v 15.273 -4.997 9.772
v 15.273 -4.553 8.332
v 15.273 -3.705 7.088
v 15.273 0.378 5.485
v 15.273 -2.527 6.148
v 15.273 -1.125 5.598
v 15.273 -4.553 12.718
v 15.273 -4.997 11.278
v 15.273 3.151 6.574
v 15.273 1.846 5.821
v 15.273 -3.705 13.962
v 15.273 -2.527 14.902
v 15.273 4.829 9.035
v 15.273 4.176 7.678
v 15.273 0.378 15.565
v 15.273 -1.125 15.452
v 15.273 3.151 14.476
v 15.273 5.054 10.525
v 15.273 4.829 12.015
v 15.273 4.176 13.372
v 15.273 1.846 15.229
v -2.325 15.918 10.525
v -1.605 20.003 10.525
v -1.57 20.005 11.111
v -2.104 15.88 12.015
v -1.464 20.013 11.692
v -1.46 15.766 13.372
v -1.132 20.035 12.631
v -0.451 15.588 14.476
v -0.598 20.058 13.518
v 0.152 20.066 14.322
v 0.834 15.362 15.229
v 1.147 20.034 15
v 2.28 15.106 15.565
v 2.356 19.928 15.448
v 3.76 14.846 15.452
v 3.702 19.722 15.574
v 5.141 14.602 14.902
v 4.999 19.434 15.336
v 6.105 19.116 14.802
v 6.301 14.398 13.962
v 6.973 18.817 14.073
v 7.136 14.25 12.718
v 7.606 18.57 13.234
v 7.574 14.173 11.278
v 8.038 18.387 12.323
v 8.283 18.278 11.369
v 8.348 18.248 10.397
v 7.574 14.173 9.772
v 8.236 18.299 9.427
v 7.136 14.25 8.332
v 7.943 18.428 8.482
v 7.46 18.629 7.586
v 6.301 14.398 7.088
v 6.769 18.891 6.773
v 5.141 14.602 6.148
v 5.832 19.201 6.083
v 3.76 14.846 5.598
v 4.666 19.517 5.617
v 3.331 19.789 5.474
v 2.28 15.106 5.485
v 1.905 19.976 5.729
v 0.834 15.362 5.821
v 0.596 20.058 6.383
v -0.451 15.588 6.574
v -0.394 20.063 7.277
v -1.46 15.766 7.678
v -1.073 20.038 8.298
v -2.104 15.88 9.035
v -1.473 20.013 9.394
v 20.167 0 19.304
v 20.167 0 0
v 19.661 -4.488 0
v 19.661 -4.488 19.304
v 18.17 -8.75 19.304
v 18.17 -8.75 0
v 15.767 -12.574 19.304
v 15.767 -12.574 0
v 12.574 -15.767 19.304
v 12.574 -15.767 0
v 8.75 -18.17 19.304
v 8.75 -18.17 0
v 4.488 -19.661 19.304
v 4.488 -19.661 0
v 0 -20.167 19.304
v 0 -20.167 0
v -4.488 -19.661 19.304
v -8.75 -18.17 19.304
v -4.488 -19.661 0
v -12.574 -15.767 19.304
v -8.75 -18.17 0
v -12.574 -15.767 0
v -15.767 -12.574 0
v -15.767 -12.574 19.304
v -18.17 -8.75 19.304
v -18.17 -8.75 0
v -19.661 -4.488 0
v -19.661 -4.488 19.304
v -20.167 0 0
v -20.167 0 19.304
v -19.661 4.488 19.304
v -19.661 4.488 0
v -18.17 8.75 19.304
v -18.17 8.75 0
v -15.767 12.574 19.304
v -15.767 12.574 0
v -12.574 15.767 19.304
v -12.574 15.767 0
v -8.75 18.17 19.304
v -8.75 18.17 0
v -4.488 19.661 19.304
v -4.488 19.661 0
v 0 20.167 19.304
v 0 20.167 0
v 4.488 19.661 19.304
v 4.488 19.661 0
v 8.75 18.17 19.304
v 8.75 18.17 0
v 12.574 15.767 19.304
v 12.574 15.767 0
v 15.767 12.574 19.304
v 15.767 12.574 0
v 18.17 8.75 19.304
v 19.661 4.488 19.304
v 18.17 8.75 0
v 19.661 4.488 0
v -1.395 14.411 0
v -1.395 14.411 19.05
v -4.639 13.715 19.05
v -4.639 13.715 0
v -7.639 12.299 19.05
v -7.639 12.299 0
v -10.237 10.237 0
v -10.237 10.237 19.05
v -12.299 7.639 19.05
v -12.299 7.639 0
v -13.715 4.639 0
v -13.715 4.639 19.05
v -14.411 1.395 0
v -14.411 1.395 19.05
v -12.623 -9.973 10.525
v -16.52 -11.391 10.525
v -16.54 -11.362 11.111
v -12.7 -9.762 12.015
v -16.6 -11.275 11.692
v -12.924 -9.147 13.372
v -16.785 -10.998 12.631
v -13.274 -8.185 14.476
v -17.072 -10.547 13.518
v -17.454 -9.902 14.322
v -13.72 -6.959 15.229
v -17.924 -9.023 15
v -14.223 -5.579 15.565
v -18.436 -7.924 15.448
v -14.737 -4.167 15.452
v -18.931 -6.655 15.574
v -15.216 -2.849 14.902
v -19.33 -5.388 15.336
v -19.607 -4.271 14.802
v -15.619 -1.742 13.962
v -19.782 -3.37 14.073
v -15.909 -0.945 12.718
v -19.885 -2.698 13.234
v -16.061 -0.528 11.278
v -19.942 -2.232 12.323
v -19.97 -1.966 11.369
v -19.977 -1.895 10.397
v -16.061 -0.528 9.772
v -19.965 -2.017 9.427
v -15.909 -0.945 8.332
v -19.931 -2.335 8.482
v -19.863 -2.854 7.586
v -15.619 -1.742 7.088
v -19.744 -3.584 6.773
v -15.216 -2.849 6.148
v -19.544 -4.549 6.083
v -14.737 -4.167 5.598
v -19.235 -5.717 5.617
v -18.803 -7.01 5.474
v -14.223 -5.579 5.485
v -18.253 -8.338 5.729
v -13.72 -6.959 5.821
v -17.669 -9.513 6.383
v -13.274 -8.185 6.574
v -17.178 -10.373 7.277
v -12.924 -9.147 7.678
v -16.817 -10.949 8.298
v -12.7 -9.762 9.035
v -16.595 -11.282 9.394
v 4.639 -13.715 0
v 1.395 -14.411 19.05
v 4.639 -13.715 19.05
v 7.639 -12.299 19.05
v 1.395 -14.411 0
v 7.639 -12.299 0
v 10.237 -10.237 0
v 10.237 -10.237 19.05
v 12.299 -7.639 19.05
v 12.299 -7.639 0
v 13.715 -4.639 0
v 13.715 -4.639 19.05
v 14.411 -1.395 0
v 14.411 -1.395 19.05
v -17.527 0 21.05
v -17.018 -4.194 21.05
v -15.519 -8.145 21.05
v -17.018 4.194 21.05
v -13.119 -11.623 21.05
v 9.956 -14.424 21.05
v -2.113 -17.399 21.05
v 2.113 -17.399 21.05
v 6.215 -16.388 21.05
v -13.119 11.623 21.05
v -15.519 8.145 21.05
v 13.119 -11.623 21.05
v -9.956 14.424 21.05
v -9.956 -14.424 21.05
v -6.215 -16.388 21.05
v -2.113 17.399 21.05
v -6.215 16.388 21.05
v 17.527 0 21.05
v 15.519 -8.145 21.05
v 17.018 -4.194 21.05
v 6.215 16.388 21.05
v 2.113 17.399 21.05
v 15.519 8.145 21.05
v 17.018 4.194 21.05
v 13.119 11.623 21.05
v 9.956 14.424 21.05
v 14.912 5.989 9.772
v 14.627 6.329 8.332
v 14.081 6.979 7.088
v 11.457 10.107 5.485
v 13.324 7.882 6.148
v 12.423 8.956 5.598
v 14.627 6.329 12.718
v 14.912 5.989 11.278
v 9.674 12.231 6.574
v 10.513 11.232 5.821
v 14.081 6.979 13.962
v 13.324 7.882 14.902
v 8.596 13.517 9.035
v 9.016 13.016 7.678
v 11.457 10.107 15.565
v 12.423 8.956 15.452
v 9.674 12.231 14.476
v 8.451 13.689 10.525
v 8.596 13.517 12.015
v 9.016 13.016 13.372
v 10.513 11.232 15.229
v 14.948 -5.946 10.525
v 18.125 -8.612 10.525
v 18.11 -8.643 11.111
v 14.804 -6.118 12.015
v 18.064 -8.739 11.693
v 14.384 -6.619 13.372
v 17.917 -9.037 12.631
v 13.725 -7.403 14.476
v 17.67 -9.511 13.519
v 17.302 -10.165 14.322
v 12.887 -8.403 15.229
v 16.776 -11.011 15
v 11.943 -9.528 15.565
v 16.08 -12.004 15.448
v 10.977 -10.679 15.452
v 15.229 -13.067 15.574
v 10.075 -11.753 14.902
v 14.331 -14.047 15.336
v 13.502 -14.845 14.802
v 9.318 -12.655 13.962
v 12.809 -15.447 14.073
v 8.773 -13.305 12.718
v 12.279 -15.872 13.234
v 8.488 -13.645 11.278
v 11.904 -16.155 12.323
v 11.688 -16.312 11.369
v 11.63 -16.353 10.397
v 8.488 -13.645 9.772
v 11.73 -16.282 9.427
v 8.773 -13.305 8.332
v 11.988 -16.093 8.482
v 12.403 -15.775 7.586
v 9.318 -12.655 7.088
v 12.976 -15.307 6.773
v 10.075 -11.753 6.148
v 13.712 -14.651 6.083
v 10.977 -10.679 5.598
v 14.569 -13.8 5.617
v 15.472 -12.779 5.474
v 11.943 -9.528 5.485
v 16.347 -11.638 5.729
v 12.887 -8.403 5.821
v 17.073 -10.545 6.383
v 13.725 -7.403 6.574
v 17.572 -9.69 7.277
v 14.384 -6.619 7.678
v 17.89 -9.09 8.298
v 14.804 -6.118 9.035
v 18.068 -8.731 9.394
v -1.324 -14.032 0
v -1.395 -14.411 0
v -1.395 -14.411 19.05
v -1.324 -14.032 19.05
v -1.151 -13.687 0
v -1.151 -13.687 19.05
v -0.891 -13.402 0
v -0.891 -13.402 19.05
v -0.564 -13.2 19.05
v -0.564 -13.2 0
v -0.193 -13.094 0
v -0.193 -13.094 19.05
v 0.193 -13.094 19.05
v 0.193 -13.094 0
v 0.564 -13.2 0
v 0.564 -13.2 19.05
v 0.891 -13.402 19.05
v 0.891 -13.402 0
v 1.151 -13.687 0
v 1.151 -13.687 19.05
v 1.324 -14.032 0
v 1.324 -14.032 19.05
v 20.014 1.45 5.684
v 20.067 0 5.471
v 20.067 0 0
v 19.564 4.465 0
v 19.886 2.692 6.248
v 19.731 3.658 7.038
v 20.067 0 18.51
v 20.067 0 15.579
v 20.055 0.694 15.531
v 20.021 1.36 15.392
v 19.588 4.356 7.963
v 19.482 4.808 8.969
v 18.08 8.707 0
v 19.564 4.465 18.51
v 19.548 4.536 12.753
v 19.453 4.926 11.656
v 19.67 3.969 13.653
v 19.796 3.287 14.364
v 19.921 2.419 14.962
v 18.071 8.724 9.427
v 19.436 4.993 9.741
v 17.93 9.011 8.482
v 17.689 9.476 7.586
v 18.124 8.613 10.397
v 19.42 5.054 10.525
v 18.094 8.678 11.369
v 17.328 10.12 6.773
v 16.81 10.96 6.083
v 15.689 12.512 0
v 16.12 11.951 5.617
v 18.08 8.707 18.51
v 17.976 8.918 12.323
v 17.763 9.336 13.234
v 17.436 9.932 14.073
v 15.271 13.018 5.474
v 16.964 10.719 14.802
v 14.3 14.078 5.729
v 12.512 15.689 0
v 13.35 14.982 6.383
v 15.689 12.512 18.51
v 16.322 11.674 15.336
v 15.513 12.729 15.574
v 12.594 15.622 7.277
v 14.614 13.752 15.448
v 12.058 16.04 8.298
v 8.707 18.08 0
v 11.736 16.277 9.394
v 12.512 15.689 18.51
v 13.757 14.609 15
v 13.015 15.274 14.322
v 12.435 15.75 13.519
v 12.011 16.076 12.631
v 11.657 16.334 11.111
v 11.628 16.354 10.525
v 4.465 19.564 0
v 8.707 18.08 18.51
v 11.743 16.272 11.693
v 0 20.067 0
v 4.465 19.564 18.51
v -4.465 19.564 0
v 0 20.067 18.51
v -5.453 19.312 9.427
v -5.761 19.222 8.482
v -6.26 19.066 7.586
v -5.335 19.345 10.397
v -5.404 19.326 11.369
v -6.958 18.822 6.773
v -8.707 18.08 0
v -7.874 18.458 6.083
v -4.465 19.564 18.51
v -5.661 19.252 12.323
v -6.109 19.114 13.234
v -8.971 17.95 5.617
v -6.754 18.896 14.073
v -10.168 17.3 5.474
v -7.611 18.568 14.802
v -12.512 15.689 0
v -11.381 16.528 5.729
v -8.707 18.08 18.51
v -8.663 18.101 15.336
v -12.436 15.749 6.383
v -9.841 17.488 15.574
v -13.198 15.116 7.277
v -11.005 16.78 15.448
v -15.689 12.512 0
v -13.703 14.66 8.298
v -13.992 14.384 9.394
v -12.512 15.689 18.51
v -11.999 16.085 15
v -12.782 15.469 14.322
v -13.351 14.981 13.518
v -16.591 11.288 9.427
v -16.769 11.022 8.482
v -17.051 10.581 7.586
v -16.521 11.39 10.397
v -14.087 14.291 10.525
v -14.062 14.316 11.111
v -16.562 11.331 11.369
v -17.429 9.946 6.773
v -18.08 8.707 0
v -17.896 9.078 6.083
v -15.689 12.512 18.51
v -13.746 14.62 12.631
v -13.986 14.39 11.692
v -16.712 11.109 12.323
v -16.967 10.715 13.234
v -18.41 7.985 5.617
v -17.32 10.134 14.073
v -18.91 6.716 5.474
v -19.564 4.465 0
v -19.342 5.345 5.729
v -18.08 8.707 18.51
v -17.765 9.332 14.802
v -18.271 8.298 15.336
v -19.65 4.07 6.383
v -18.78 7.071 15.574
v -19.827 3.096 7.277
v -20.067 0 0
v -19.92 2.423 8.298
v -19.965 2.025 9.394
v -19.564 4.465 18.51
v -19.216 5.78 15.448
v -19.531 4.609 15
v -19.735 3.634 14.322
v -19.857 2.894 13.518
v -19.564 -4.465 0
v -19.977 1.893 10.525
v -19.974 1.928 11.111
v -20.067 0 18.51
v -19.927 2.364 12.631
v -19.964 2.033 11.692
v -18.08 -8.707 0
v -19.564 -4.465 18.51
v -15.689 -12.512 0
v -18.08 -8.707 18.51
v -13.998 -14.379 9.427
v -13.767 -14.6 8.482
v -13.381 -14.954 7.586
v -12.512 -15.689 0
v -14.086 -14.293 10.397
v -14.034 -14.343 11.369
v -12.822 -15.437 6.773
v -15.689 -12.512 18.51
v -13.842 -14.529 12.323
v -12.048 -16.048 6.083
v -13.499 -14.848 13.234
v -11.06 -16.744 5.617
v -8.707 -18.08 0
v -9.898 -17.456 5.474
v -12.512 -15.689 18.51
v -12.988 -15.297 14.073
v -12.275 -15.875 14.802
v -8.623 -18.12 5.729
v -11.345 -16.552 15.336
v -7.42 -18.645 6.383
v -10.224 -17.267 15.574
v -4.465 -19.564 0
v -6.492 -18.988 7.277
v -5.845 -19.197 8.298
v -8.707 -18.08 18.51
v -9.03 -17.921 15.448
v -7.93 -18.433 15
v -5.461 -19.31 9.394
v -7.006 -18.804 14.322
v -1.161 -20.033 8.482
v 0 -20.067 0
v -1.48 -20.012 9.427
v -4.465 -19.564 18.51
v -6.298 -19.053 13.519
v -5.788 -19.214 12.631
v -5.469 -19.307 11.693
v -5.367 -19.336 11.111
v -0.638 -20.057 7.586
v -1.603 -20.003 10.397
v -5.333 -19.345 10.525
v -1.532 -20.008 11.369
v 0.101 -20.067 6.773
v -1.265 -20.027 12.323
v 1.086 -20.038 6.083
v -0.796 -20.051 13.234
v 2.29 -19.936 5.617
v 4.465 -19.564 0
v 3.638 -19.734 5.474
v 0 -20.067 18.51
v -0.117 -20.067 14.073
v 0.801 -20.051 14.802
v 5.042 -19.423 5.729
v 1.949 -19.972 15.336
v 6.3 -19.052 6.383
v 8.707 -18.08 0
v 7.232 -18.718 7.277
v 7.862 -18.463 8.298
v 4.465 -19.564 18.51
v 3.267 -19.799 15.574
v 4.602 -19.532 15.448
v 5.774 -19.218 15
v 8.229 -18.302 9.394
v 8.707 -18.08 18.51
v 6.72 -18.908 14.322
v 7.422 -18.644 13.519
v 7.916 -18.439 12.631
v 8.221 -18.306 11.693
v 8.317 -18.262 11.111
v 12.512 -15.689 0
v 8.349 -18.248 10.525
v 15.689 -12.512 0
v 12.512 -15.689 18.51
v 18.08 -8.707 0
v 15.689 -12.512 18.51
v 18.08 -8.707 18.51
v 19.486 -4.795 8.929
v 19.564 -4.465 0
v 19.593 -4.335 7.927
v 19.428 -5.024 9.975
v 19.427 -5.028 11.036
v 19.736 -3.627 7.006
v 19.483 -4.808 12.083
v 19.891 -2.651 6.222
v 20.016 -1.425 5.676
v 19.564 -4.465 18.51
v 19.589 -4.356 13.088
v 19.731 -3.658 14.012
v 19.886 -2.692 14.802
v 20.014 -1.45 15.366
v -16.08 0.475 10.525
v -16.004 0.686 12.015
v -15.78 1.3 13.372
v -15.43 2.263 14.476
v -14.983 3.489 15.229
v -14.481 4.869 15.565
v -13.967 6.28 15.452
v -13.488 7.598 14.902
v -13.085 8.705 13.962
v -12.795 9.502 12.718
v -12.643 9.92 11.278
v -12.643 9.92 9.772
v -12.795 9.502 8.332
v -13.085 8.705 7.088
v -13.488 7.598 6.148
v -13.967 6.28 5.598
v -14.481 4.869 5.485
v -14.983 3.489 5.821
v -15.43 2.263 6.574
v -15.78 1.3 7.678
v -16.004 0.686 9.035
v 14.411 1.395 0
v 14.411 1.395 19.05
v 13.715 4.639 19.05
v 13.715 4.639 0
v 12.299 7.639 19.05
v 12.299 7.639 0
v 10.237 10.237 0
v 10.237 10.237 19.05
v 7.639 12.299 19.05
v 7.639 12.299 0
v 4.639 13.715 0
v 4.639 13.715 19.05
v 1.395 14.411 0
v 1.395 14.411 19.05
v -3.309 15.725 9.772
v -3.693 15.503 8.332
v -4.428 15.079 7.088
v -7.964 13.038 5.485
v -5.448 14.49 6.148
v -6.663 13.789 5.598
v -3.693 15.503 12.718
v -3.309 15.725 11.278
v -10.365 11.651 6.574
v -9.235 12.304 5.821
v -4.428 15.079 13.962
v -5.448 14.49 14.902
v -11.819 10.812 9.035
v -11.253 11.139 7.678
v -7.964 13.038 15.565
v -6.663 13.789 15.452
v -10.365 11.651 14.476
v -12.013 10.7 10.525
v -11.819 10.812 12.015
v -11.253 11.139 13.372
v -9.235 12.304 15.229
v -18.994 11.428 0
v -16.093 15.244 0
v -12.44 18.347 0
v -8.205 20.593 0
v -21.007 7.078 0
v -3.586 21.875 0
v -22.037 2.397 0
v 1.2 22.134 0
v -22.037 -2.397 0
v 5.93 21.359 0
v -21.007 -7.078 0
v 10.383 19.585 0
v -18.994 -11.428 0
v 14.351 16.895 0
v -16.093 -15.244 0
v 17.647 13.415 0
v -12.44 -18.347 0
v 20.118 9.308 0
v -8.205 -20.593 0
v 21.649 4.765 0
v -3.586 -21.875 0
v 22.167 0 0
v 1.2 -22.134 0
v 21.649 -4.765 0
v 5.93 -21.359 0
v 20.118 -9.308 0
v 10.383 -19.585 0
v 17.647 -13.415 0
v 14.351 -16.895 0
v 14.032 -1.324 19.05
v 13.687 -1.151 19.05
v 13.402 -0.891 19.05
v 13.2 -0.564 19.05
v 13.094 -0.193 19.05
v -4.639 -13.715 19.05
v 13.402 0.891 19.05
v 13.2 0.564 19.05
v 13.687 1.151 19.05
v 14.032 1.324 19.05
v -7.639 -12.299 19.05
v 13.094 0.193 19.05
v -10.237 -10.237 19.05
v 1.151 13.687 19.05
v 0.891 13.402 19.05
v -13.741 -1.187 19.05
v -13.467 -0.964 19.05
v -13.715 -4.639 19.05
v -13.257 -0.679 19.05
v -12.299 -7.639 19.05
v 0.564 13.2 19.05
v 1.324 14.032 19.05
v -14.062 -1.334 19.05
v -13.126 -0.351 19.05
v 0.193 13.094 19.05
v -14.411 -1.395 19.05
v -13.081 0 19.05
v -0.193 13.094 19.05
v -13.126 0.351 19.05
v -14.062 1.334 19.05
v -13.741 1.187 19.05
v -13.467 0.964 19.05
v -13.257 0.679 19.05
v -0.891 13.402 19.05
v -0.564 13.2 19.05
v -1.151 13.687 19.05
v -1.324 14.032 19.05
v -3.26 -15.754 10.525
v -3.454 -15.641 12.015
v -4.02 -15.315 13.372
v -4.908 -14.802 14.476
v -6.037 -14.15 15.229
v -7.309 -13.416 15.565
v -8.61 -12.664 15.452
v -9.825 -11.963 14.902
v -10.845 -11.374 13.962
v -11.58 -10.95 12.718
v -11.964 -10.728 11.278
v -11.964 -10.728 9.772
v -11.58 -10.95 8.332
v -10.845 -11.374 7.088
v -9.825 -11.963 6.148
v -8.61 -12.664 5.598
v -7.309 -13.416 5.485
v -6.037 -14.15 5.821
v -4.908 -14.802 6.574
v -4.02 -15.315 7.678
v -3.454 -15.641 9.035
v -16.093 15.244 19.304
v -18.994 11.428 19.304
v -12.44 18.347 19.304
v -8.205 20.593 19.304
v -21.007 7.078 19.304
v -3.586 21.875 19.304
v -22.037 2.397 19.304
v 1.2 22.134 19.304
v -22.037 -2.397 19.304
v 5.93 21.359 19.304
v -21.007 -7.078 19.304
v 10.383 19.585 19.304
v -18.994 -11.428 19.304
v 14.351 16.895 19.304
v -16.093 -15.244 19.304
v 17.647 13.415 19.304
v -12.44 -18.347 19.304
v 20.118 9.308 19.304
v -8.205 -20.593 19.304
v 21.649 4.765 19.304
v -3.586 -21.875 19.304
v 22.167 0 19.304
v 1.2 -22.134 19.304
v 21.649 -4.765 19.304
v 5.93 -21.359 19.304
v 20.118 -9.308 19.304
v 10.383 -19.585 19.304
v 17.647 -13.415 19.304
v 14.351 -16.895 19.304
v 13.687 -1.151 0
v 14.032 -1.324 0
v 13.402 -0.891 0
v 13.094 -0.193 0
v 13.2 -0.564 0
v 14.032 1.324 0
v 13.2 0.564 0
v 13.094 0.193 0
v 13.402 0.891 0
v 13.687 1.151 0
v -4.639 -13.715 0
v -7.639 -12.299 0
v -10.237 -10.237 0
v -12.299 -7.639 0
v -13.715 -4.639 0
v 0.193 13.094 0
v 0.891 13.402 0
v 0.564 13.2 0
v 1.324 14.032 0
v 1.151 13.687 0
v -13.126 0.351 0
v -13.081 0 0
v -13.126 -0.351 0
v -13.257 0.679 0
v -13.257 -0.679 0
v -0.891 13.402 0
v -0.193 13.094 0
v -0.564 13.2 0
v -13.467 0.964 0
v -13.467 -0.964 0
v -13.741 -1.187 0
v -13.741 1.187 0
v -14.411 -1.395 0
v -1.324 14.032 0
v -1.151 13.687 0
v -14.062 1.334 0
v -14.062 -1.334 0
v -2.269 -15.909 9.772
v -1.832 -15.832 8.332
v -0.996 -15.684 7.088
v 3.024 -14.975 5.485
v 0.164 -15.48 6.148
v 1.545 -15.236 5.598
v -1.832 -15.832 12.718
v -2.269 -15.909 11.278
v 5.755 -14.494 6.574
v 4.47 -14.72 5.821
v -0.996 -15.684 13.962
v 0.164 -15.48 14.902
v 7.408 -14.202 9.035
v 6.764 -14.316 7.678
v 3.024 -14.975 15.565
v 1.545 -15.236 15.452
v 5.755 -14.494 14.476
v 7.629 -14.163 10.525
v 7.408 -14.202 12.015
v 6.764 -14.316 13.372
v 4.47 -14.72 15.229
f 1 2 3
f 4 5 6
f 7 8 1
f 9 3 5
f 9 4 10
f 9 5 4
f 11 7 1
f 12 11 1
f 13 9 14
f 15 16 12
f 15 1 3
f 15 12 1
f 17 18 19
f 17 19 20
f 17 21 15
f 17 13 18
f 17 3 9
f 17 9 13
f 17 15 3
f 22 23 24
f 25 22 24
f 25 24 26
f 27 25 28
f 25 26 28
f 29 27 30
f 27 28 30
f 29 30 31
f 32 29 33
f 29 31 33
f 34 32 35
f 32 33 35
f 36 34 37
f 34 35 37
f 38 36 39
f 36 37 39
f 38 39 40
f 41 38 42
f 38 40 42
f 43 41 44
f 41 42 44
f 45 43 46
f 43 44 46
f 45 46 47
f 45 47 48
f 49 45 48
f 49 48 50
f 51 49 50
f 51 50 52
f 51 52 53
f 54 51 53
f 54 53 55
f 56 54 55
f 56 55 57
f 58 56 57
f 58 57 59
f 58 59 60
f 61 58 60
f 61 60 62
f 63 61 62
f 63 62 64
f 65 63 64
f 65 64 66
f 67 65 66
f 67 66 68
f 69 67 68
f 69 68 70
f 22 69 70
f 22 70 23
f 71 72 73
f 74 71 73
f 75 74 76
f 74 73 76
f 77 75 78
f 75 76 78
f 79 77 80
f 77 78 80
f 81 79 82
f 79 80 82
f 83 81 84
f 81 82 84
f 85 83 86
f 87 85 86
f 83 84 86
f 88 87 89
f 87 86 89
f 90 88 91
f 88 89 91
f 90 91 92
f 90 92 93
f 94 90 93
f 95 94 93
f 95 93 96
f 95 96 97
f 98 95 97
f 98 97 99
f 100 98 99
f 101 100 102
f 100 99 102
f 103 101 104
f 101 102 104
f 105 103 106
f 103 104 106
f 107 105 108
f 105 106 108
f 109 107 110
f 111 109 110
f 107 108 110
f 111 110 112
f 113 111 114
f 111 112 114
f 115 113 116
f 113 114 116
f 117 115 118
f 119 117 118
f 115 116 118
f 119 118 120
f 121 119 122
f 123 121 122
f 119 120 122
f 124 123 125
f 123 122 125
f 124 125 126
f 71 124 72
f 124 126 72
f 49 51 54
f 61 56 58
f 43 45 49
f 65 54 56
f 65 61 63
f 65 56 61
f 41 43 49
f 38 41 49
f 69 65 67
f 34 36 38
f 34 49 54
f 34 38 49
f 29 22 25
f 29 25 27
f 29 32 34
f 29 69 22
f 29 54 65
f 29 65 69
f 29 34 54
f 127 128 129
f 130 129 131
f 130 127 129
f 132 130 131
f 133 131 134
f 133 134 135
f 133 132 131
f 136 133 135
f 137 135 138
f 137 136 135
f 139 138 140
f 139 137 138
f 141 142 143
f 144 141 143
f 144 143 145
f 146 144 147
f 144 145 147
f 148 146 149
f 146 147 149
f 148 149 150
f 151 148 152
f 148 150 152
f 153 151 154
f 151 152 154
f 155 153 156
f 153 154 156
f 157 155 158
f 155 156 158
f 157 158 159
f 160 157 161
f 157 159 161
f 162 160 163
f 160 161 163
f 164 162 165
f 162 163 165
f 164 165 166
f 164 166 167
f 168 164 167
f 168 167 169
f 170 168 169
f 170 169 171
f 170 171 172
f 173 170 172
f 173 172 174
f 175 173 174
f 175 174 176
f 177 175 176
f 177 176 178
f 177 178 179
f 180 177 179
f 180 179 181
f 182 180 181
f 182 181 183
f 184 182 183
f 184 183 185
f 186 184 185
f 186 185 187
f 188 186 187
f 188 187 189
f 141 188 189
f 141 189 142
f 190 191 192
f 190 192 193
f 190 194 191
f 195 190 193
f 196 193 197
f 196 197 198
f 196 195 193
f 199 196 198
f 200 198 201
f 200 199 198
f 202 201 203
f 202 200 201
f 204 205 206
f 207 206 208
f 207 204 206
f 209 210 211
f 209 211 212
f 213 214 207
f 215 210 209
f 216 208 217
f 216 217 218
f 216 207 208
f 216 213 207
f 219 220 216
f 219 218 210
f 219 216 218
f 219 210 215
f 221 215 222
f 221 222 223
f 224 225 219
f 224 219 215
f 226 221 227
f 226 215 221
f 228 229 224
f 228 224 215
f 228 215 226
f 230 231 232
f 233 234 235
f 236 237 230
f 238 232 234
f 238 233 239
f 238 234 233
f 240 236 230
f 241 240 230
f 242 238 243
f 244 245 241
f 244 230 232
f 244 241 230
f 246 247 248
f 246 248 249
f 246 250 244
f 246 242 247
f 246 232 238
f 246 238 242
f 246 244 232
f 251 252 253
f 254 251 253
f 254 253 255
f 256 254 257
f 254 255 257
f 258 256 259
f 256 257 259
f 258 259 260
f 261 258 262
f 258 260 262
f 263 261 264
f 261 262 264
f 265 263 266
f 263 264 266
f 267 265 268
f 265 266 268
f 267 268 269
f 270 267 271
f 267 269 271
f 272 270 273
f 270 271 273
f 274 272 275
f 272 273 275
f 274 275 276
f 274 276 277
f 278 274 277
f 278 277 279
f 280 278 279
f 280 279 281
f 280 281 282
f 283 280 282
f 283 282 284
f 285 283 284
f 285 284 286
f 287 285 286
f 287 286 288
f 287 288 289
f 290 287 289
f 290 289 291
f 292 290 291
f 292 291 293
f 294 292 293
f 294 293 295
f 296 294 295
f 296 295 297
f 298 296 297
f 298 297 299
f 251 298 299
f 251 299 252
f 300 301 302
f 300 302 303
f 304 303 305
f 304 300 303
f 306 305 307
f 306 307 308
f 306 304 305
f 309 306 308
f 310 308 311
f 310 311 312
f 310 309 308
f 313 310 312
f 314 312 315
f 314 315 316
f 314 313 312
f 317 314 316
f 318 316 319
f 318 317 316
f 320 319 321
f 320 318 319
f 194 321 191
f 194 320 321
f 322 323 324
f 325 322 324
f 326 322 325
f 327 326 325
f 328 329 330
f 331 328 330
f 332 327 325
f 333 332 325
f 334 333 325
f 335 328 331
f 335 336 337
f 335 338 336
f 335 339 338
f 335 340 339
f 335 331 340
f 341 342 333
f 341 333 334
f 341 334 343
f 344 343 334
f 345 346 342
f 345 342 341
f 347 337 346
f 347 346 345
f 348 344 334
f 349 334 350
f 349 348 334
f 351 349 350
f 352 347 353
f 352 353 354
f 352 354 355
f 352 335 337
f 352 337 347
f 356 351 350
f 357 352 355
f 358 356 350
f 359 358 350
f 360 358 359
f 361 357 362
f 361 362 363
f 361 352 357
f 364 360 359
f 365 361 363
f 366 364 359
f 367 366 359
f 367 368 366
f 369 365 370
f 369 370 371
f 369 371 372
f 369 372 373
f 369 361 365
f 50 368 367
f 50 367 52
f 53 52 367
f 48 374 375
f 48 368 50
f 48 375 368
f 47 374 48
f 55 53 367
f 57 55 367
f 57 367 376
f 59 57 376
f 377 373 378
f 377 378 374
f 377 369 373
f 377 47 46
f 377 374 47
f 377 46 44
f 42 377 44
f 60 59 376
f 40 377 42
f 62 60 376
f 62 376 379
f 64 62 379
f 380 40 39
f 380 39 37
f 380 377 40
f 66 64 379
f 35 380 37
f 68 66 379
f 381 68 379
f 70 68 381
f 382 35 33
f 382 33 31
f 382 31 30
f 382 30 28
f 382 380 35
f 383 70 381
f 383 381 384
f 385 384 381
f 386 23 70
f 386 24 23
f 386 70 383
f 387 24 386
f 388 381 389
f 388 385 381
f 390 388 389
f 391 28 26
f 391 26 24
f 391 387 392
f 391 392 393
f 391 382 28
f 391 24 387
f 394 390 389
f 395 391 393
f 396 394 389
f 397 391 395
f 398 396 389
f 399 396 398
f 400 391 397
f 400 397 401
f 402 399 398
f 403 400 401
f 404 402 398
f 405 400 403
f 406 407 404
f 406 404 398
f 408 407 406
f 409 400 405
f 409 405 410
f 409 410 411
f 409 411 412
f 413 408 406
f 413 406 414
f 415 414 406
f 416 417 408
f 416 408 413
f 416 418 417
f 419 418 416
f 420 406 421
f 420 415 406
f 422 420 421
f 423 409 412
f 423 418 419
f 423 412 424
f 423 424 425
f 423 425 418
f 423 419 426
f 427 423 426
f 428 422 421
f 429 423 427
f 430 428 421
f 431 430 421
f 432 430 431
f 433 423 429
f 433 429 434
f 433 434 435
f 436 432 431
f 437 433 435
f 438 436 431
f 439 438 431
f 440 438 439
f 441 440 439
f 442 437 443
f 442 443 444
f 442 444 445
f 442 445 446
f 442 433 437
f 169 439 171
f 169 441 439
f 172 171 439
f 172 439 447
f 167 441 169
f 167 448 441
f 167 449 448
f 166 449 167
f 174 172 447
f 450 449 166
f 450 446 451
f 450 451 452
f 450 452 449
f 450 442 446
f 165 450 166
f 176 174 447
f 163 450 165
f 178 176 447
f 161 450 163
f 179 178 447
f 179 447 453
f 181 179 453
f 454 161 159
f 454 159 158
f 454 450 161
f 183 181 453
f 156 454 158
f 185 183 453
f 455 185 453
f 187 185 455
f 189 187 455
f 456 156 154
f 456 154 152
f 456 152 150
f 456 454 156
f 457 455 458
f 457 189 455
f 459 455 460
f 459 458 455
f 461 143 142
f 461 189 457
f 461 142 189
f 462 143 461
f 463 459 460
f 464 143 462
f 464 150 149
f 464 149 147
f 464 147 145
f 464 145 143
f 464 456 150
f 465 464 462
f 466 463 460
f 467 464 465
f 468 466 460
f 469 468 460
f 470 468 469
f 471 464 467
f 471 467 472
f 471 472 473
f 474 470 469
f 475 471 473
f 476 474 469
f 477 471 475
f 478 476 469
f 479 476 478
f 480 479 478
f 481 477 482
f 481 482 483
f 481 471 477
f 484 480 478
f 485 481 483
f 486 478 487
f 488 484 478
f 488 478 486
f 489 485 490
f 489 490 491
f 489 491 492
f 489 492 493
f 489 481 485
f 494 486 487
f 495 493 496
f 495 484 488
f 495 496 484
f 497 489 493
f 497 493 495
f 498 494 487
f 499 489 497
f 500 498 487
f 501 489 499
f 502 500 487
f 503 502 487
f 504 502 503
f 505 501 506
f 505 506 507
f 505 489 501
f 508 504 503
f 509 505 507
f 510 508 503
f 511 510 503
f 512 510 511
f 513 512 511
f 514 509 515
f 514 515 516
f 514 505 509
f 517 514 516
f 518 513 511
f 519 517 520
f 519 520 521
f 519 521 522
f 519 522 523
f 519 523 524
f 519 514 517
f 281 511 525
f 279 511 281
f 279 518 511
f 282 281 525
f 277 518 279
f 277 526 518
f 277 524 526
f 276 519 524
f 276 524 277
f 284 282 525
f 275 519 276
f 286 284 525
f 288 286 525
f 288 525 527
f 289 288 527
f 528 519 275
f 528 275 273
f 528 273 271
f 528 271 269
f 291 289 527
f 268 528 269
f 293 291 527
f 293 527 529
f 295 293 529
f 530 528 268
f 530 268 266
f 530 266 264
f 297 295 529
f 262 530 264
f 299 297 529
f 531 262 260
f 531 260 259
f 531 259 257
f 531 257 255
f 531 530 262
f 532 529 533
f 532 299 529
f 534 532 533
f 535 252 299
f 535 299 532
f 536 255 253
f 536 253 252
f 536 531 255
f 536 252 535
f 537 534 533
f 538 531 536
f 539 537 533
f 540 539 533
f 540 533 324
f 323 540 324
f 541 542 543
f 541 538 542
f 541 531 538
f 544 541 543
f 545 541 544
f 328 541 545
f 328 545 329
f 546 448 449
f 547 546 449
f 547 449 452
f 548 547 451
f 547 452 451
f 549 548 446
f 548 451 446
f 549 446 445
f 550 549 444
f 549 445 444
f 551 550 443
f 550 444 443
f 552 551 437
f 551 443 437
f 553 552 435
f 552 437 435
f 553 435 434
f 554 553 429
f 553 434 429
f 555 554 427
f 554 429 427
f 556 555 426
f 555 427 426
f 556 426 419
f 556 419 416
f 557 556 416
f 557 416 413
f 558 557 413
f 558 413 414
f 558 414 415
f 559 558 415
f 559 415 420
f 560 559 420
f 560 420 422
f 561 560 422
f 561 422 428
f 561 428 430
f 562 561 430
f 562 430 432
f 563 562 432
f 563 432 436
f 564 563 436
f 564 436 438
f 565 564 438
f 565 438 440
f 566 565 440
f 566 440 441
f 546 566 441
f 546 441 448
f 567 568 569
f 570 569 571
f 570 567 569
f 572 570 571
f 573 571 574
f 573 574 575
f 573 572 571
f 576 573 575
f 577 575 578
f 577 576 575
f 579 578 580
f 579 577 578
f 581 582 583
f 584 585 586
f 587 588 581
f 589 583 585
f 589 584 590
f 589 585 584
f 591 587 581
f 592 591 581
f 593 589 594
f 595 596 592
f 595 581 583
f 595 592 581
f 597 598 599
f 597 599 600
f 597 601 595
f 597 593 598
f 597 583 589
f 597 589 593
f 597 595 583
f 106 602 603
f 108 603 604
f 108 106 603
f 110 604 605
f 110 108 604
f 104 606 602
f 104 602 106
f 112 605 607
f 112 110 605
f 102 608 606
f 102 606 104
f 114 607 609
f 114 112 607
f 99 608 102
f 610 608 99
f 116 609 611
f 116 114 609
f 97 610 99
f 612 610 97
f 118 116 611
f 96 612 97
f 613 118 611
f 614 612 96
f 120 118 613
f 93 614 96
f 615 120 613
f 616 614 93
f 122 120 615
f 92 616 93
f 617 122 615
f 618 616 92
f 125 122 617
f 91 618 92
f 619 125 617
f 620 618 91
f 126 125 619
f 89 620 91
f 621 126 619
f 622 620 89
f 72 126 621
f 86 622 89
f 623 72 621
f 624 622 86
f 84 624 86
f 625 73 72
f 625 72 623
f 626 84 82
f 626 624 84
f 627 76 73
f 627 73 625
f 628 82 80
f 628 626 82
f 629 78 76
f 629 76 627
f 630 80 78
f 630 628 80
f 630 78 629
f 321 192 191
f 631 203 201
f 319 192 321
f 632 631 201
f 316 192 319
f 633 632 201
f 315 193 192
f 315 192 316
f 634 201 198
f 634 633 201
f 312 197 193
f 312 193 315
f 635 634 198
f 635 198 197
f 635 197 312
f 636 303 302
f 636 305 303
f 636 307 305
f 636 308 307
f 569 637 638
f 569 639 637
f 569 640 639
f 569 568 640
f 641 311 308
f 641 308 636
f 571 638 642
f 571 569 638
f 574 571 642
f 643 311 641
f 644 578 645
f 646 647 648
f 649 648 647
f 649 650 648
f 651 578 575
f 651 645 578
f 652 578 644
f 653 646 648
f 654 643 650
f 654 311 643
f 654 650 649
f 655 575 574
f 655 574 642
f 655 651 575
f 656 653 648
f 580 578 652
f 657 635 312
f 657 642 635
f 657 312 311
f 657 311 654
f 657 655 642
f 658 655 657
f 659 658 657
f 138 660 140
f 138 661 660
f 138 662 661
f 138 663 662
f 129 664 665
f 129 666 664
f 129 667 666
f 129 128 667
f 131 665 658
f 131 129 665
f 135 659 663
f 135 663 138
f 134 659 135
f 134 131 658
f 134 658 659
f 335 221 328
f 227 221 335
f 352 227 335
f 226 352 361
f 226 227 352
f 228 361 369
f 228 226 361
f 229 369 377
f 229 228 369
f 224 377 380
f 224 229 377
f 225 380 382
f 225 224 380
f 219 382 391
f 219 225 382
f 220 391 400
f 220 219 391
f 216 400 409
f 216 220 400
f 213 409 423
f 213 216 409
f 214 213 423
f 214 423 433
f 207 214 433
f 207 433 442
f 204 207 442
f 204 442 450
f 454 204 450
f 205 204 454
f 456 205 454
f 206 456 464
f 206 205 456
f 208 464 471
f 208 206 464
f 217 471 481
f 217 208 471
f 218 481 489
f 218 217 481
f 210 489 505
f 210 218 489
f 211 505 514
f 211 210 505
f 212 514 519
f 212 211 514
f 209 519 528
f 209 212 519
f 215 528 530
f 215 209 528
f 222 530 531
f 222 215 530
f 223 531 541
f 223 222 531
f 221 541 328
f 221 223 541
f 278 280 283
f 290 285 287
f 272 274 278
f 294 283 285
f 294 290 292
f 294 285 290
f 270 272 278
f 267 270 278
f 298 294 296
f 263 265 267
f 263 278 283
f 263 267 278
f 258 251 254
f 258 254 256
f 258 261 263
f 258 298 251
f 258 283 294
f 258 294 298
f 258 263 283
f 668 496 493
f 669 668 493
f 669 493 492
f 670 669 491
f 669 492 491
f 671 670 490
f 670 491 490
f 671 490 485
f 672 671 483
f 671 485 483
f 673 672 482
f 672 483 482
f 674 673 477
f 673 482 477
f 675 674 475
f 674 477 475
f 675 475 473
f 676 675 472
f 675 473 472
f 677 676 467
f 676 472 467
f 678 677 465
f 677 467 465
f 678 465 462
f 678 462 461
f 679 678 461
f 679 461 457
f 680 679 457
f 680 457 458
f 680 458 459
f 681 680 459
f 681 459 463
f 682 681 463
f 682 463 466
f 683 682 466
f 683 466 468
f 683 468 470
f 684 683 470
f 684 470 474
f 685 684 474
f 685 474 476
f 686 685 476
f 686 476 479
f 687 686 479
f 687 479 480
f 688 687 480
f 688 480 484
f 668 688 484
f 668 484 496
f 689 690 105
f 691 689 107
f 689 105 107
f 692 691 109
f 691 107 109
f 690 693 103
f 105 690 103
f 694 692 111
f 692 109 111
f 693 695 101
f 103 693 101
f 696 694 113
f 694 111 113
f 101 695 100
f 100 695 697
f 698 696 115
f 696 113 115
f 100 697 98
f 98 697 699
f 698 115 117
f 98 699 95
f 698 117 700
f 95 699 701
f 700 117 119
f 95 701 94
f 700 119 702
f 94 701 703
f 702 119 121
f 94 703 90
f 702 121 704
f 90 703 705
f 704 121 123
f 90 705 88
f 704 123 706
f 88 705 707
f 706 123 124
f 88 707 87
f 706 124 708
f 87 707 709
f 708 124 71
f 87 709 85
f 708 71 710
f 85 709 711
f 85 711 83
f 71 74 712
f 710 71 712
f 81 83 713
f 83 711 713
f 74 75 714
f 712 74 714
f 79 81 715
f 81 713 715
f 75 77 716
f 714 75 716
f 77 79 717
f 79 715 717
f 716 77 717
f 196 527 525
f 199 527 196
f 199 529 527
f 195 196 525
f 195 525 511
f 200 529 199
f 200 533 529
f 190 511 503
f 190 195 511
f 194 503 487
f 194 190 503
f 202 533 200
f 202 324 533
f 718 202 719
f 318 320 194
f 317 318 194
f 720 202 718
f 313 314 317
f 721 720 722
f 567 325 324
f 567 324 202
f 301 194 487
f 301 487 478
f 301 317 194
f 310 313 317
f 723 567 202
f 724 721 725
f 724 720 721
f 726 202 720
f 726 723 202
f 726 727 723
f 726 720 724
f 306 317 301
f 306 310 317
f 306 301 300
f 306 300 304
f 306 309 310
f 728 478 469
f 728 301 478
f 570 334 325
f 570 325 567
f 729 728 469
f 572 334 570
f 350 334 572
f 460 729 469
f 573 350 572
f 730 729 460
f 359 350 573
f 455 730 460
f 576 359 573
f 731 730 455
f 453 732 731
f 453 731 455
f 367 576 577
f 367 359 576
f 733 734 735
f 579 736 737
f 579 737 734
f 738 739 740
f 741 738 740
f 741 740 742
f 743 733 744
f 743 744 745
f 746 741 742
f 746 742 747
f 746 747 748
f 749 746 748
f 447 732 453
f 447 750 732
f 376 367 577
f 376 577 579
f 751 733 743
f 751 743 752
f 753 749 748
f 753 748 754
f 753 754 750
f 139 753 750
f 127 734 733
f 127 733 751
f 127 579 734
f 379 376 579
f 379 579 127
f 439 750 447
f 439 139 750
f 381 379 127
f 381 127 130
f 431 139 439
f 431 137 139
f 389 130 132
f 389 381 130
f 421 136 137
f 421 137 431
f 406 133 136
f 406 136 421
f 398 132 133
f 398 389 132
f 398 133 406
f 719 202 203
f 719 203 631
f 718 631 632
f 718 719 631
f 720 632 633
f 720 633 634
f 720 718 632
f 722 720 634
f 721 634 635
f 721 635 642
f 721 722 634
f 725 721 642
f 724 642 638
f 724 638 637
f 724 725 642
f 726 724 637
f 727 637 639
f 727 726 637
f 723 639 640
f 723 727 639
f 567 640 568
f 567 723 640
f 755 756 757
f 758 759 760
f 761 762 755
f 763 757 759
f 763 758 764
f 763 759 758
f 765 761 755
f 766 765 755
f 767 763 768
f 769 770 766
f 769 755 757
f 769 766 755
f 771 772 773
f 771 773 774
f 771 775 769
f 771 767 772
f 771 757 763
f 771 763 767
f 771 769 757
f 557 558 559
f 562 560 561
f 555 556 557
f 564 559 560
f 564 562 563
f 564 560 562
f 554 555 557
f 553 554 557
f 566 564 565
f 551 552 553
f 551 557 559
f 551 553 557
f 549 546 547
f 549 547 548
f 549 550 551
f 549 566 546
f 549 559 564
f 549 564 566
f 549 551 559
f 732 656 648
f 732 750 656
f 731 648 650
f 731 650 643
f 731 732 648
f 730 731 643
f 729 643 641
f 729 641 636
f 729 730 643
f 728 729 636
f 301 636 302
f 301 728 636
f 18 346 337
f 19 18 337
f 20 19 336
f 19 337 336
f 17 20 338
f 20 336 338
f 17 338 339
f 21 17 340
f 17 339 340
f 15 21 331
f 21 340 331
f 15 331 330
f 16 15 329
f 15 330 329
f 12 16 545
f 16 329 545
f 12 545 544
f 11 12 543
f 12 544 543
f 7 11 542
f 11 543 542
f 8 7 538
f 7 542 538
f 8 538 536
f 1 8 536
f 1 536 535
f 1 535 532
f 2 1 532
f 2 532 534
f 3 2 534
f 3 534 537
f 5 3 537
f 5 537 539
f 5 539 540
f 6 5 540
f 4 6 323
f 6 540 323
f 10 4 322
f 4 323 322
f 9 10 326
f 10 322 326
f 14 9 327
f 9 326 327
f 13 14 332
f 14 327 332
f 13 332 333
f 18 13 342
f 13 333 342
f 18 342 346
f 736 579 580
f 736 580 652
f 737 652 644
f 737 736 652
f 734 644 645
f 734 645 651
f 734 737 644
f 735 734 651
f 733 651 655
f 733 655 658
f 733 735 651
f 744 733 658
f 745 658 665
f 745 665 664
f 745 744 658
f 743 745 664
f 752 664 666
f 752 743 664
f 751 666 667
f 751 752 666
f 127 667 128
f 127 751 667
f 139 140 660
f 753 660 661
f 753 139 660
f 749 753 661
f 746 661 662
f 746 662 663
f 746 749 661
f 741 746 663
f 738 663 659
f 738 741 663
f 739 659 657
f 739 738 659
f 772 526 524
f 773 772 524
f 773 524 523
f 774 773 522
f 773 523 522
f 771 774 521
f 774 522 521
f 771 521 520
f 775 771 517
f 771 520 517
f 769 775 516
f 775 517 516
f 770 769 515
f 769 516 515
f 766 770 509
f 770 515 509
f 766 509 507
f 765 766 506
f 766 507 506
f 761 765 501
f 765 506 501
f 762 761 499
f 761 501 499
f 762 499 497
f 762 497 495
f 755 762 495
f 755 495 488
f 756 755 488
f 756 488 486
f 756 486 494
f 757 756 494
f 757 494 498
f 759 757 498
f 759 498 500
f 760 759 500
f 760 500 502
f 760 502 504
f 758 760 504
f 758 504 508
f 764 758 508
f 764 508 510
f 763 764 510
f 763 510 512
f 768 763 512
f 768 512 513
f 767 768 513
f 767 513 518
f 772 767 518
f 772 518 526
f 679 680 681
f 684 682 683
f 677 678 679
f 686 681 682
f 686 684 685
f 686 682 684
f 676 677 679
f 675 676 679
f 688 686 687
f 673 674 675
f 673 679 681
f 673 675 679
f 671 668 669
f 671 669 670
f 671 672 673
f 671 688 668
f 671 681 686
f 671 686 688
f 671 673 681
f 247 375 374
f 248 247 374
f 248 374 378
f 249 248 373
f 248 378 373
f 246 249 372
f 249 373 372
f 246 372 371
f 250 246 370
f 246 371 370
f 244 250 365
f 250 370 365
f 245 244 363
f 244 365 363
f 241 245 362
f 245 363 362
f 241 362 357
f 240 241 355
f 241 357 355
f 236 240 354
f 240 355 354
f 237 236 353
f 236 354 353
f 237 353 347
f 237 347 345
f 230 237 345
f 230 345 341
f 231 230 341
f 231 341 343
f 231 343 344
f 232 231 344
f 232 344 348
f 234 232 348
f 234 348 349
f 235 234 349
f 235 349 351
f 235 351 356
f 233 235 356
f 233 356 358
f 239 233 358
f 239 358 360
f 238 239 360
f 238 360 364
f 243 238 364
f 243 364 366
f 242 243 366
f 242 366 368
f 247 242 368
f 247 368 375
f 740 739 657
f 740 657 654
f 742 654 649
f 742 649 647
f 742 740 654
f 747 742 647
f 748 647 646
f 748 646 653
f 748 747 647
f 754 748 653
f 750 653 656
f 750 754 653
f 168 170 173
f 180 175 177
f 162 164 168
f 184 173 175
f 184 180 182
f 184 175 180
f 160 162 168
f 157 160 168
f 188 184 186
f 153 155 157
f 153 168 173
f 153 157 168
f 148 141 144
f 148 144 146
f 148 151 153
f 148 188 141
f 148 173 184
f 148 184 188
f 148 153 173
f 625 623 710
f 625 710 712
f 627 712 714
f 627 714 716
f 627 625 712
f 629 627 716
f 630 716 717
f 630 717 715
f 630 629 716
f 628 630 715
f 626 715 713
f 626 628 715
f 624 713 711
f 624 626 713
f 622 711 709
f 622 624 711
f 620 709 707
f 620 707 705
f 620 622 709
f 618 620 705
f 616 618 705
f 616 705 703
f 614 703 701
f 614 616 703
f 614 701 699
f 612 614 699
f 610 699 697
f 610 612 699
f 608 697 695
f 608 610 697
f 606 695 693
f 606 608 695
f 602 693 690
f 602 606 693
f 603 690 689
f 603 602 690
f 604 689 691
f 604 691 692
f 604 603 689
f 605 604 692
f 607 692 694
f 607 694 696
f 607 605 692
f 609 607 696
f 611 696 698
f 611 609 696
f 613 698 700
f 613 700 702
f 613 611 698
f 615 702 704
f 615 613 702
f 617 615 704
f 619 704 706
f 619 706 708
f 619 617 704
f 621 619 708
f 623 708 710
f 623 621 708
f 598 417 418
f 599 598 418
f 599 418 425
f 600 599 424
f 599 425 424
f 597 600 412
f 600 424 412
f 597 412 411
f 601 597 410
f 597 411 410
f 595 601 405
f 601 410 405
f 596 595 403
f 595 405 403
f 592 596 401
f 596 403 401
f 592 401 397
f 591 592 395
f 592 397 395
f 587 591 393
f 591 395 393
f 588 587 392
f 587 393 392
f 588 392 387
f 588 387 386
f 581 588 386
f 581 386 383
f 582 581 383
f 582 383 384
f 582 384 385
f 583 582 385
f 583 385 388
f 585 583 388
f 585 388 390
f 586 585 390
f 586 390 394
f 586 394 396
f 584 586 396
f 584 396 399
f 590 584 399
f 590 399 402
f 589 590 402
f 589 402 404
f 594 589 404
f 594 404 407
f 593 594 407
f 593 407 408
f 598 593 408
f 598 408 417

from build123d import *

# Parameters (mm, degrees)
F2_R      = 20.06694
F3_DEPTH  = 19.05
F5_R      = 5.0538
F6_DEPTH  = 4.793996
F7_COUNT  = 9
F9_SIZE   = 2.54
F10_R     = 22.16694
F10_R_2   = 20.16694
F11_DEPTH = 19.304


# Not quite as in the source:
# - a feature names something its author has since deleted; it is built from what else it names


with BuildPart() as f1:
    # F0 (on Front) → F1 (revolve)
    with BuildSketch(Plane.XZ):
        Polygon((0, 21.05), (0, 19.05), (14.478, 19.05), (14.478, 0), (20.06694, 0), (20.06694, 21.05), align=None)
    revolve(axis=Axis((0, 0, 5.8315382339), (0, 0, 1)))

    # F2 (on face) → F3 (join, through all)
    with BuildSketch(Plane(origin=(0, 0, 0), x_dir=(1, 0, 0), z_dir=(0, 0, -1))):
        Circle(F2_R)
        with BuildLine():
            ThreePointArc((1.3953731968, 14.4106008772), (10.237491978, 10.237491978), (14.4106008772, 1.3953731968))
            ThreePointArc((14.4106008772, 1.3953731968), (15.4417044219, 1.0113766792), (15.875, 0))
            ThreePointArc((15.875, 0), (15.4417044219, -1.0113766792), (14.4106008772, -1.3953731968))
            ThreePointArc((14.4106008772, -1.3953731968), (10.237491978, -10.237491978), (1.3953731968, -14.4106008772))
            ThreePointArc((1.3953731968, -14.4106008772), (1.39659324, -14.4442906235), (1.397, -14.478))
            ThreePointArc((1.397, -14.478), (-0.0337093765, -15.87459324), (-1.3953731968, -14.4106008772))
            ThreePointArc((-1.3953731968, -14.4106008772), (-10.237491978, -10.237491978), (-14.4106008772, -1.3953731968))
            ThreePointArc((-14.4106008772, -1.3953731968), (-15.875, 0), (-14.4106008772, 1.3953731968))
            ThreePointArc((-14.4106008772, 1.3953731968), (-10.237491978, 10.237491978), (-1.3953731968, 14.4106008772))
            ThreePointArc((-1.3953731968, 14.4106008772), (-0.0337093765, 15.87459324), (1.397, 14.478))
            ThreePointArc((1.397, 14.478), (1.39659324, 14.4442906235), (1.3953731968, 14.4106008772))
        make_face(mode=Mode.SUBTRACT)
        with BuildLine():
            ThreePointArc((-1.3953731968, 14.4106008772), (0, 13.081), (1.3953731968, 14.4106008772))
            ThreePointArc((1.3953731968, 14.4106008772), (0, 14.478), (-1.3953731968, 14.4106008772))
        make_face()
        with BuildLine():
            ThreePointArc((14.4106008772, -1.3953731968), (14.4611404028, -0.6985), (14.478, 0))
            ThreePointArc((14.478, 0), (14.4611404028, 0.6985), (14.4106008772, 1.3953731968))
            ThreePointArc((14.4106008772, 1.3953731968), (13.081, 0), (14.4106008772, -1.3953731968))
        make_face()
        with BuildLine():
            ThreePointArc((14.4106008772, 1.3953731968), (14.4611404028, 0.6985), (14.478, 0))
            ThreePointArc((14.478, 0), (14.4611404028, -0.6985), (14.4106008772, -1.3953731968))
            ThreePointArc((14.4106008772, -1.3953731968), (15.4417044219, -1.0113766792), (15.875, 0))
            ThreePointArc((15.875, 0), (15.4417044219, 1.0113766792), (14.4106008772, 1.3953731968))
        make_face()
        with BuildLine():
            ThreePointArc((-1.3953731968, -14.4106008772), (0, -14.478), (1.3953731968, -14.4106008772))
            ThreePointArc((1.3953731968, -14.4106008772), (0, -13.081), (-1.3953731968, -14.4106008772))
        make_face()
        with BuildLine():
            ThreePointArc((1.397, -14.478), (1.39659324, -14.4442906235), (1.3953731968, -14.4106008772))
            ThreePointArc((1.3953731968, -14.4106008772), (0, -14.478), (-1.3953731968, -14.4106008772))
            ThreePointArc((-1.3953731968, -14.4106008772), (-0.0337093765, -15.87459324), (1.397, -14.478))
        make_face()
        with BuildLine():
            ThreePointArc((-14.4106008772, -1.3953731968), (-14.478, 0), (-14.4106008772, 1.3953731968))
            ThreePointArc((-14.4106008772, 1.3953731968), (-15.875, 0), (-14.4106008772, -1.3953731968))
        make_face()
        with BuildLine():
            ThreePointArc((-13.081, 0), (-13.4666233208, 0.9637044219), (-14.4106008772, 1.3953731968))
            ThreePointArc((-14.4106008772, 1.3953731968), (-14.478, 0), (-14.4106008772, -1.3953731968))
            ThreePointArc((-14.4106008772, -1.3953731968), (-13.4666233208, -0.9637044219), (-13.081, 0))
        make_face()
    extrude(amount=-F3_DEPTH)


with BuildPart() as f6:
    # F5 (on offset) → F6 (new body)
    with BuildSketch(Plane.YZ.offset(20.0669398)):
        with Locations((0, 10.525)):
            Circle(F5_R)
    extrude(amount=-F6_DEPTH)


with BuildPart() as f7_1:
    # F7: instance of F6
    add(f6.part.rotate(Axis((0, 0, 5.8315382339), (0, 0, 1)), 1 * 360 / F7_COUNT))


with BuildPart() as f7_2:
    # F7: instance of F6
    add(f6.part.rotate(Axis((0, 0, 5.8315382339), (0, 0, 1)), 2 * 360 / F7_COUNT))


with BuildPart() as f7_3:
    # F7: instance of F6
    add(f6.part.rotate(Axis((0, 0, 5.8315382339), (0, 0, 1)), 3 * 360 / F7_COUNT))


with BuildPart() as f7_4:
    # F7: instance of F6
    add(f6.part.rotate(Axis((0, 0, 5.8315382339), (0, 0, 1)), 4 * 360 / F7_COUNT))


with BuildPart() as f7_5:
    # F7: instance of F6
    add(f6.part.rotate(Axis((0, 0, 5.8315382339), (0, 0, 1)), 5 * 360 / F7_COUNT))


with BuildPart() as f7_6:
    # F7: instance of F6
    add(f6.part.rotate(Axis((0, 0, 5.8315382339), (0, 0, 1)), 6 * 360 / F7_COUNT))


with BuildPart() as f7_7:
    # F7: instance of F6
    add(f6.part.rotate(Axis((0, 0, 5.8315382339), (0, 0, 1)), 7 * 360 / F7_COUNT))


with BuildPart() as f7_8:
    # F7: instance of F6
    add(f6.part.rotate(Axis((0, 0, 5.8315382339), (0, 0, 1)), 8 * 360 / F7_COUNT))


with BuildPart() as f1_1:
    add(f1.part)

    # F8: cut F6, F7_2, F7_4, F7_6, F7_8, F7_7, F7_5, F7_3, F7_1
    add(f6.part, mode=Mode.SUBTRACT)
    add(f7_2.part, mode=Mode.SUBTRACT)
    add(f7_4.part, mode=Mode.SUBTRACT)
    add(f7_6.part, mode=Mode.SUBTRACT)
    add(f7_8.part, mode=Mode.SUBTRACT)
    add(f7_7.part, mode=Mode.SUBTRACT)
    add(f7_5.part, mode=Mode.SUBTRACT)
    add(f7_3.part, mode=Mode.SUBTRACT)
    add(f7_1.part, mode=Mode.SUBTRACT)

    # F9
    f9_edges = [f1_1.edges().sort_by_distance(p)[0] for p in [
        (-20.06694, 0, 21.05),
    ]]
    chamfer(f9_edges, length=F9_SIZE)


with BuildPart() as f11:
    # F10 (on face) → F11 (new body)
    with BuildSketch(Plane(origin=(0, 0, 0), x_dir=(1, 0, 0), z_dir=(0, 0, -1))):
        Circle(F10_R)
        Circle(F10_R_2, mode=Mode.SUBTRACT)
    extrude(amount=-F11_DEPTH)


solid = Compound([f1_1.part, f11.part])
